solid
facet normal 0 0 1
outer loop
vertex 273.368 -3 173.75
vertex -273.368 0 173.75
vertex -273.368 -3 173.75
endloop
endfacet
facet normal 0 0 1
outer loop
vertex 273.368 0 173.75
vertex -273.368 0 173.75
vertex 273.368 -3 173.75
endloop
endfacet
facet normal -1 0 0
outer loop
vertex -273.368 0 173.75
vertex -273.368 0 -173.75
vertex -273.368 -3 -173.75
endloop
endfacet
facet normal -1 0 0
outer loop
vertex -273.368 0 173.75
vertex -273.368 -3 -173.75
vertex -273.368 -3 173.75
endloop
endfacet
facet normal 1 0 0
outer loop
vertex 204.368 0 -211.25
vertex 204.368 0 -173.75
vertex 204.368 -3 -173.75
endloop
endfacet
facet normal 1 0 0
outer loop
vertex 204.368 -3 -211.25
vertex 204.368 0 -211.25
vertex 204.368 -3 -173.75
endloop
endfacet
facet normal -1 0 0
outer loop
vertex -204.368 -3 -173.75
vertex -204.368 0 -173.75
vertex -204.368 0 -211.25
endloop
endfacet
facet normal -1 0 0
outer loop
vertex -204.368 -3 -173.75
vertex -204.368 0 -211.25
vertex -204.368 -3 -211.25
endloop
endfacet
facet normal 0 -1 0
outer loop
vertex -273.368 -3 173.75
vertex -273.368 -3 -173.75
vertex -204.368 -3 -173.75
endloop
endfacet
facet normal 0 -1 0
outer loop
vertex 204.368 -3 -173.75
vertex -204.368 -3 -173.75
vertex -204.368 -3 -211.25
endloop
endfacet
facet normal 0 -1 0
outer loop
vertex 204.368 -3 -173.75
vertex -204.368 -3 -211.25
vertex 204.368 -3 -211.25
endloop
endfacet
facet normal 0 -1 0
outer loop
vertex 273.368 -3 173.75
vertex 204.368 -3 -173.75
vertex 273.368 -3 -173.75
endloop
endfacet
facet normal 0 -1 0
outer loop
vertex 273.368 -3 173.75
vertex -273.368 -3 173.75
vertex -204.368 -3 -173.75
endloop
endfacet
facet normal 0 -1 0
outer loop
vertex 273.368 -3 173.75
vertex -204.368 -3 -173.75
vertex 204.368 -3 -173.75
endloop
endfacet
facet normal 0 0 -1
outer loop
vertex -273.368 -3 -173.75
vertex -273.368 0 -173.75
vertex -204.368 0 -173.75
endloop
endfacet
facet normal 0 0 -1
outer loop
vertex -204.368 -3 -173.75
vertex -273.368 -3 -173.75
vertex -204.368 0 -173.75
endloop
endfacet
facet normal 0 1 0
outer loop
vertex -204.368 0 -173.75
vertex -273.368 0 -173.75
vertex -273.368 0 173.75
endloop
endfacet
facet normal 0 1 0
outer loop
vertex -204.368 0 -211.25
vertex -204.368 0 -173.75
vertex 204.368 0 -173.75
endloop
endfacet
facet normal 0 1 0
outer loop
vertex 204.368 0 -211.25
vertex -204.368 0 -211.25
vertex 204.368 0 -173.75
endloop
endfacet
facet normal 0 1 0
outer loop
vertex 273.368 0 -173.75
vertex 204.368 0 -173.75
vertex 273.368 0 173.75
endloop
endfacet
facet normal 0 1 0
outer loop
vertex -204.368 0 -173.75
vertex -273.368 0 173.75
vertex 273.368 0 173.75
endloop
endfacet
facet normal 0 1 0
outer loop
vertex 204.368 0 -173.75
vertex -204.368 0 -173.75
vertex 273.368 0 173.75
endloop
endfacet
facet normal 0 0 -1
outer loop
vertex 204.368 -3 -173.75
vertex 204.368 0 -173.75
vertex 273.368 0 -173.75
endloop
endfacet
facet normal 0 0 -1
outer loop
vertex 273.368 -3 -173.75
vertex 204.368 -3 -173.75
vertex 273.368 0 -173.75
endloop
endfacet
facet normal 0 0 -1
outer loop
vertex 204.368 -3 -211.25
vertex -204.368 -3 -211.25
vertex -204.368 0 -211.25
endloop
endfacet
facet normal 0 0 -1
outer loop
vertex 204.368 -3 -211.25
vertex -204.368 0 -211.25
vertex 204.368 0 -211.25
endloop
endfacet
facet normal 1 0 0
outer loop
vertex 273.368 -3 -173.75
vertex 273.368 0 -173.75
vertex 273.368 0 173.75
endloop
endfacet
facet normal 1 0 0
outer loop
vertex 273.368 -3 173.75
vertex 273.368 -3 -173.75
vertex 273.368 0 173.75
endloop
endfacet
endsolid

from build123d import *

# Parameters (mm, degrees)
F0_W     = 546.735
F0_H     = 347.5
F1_DEPTH = 3
F2_W     = 408.735
F2_H     = 3
F3_DEPTH = 37.5


with BuildPart() as f1:
    # F0 (on Front) → F1 (new body)
    with BuildSketch(Plane.XZ):
        Rectangle(F0_W, F0_H)
    extrude(amount=F1_DEPTH)

    # F2 (on face) → F3 (join)
    with BuildSketch(Plane(origin=(0, 0, -173.75), x_dir=(1, 0, 0), z_dir=(0, 0, -1))):
        with Locations((0, 1.5)):
            Rectangle(F2_W, F2_H)
    extrude(amount=F3_DEPTH)


solid = f1.part
